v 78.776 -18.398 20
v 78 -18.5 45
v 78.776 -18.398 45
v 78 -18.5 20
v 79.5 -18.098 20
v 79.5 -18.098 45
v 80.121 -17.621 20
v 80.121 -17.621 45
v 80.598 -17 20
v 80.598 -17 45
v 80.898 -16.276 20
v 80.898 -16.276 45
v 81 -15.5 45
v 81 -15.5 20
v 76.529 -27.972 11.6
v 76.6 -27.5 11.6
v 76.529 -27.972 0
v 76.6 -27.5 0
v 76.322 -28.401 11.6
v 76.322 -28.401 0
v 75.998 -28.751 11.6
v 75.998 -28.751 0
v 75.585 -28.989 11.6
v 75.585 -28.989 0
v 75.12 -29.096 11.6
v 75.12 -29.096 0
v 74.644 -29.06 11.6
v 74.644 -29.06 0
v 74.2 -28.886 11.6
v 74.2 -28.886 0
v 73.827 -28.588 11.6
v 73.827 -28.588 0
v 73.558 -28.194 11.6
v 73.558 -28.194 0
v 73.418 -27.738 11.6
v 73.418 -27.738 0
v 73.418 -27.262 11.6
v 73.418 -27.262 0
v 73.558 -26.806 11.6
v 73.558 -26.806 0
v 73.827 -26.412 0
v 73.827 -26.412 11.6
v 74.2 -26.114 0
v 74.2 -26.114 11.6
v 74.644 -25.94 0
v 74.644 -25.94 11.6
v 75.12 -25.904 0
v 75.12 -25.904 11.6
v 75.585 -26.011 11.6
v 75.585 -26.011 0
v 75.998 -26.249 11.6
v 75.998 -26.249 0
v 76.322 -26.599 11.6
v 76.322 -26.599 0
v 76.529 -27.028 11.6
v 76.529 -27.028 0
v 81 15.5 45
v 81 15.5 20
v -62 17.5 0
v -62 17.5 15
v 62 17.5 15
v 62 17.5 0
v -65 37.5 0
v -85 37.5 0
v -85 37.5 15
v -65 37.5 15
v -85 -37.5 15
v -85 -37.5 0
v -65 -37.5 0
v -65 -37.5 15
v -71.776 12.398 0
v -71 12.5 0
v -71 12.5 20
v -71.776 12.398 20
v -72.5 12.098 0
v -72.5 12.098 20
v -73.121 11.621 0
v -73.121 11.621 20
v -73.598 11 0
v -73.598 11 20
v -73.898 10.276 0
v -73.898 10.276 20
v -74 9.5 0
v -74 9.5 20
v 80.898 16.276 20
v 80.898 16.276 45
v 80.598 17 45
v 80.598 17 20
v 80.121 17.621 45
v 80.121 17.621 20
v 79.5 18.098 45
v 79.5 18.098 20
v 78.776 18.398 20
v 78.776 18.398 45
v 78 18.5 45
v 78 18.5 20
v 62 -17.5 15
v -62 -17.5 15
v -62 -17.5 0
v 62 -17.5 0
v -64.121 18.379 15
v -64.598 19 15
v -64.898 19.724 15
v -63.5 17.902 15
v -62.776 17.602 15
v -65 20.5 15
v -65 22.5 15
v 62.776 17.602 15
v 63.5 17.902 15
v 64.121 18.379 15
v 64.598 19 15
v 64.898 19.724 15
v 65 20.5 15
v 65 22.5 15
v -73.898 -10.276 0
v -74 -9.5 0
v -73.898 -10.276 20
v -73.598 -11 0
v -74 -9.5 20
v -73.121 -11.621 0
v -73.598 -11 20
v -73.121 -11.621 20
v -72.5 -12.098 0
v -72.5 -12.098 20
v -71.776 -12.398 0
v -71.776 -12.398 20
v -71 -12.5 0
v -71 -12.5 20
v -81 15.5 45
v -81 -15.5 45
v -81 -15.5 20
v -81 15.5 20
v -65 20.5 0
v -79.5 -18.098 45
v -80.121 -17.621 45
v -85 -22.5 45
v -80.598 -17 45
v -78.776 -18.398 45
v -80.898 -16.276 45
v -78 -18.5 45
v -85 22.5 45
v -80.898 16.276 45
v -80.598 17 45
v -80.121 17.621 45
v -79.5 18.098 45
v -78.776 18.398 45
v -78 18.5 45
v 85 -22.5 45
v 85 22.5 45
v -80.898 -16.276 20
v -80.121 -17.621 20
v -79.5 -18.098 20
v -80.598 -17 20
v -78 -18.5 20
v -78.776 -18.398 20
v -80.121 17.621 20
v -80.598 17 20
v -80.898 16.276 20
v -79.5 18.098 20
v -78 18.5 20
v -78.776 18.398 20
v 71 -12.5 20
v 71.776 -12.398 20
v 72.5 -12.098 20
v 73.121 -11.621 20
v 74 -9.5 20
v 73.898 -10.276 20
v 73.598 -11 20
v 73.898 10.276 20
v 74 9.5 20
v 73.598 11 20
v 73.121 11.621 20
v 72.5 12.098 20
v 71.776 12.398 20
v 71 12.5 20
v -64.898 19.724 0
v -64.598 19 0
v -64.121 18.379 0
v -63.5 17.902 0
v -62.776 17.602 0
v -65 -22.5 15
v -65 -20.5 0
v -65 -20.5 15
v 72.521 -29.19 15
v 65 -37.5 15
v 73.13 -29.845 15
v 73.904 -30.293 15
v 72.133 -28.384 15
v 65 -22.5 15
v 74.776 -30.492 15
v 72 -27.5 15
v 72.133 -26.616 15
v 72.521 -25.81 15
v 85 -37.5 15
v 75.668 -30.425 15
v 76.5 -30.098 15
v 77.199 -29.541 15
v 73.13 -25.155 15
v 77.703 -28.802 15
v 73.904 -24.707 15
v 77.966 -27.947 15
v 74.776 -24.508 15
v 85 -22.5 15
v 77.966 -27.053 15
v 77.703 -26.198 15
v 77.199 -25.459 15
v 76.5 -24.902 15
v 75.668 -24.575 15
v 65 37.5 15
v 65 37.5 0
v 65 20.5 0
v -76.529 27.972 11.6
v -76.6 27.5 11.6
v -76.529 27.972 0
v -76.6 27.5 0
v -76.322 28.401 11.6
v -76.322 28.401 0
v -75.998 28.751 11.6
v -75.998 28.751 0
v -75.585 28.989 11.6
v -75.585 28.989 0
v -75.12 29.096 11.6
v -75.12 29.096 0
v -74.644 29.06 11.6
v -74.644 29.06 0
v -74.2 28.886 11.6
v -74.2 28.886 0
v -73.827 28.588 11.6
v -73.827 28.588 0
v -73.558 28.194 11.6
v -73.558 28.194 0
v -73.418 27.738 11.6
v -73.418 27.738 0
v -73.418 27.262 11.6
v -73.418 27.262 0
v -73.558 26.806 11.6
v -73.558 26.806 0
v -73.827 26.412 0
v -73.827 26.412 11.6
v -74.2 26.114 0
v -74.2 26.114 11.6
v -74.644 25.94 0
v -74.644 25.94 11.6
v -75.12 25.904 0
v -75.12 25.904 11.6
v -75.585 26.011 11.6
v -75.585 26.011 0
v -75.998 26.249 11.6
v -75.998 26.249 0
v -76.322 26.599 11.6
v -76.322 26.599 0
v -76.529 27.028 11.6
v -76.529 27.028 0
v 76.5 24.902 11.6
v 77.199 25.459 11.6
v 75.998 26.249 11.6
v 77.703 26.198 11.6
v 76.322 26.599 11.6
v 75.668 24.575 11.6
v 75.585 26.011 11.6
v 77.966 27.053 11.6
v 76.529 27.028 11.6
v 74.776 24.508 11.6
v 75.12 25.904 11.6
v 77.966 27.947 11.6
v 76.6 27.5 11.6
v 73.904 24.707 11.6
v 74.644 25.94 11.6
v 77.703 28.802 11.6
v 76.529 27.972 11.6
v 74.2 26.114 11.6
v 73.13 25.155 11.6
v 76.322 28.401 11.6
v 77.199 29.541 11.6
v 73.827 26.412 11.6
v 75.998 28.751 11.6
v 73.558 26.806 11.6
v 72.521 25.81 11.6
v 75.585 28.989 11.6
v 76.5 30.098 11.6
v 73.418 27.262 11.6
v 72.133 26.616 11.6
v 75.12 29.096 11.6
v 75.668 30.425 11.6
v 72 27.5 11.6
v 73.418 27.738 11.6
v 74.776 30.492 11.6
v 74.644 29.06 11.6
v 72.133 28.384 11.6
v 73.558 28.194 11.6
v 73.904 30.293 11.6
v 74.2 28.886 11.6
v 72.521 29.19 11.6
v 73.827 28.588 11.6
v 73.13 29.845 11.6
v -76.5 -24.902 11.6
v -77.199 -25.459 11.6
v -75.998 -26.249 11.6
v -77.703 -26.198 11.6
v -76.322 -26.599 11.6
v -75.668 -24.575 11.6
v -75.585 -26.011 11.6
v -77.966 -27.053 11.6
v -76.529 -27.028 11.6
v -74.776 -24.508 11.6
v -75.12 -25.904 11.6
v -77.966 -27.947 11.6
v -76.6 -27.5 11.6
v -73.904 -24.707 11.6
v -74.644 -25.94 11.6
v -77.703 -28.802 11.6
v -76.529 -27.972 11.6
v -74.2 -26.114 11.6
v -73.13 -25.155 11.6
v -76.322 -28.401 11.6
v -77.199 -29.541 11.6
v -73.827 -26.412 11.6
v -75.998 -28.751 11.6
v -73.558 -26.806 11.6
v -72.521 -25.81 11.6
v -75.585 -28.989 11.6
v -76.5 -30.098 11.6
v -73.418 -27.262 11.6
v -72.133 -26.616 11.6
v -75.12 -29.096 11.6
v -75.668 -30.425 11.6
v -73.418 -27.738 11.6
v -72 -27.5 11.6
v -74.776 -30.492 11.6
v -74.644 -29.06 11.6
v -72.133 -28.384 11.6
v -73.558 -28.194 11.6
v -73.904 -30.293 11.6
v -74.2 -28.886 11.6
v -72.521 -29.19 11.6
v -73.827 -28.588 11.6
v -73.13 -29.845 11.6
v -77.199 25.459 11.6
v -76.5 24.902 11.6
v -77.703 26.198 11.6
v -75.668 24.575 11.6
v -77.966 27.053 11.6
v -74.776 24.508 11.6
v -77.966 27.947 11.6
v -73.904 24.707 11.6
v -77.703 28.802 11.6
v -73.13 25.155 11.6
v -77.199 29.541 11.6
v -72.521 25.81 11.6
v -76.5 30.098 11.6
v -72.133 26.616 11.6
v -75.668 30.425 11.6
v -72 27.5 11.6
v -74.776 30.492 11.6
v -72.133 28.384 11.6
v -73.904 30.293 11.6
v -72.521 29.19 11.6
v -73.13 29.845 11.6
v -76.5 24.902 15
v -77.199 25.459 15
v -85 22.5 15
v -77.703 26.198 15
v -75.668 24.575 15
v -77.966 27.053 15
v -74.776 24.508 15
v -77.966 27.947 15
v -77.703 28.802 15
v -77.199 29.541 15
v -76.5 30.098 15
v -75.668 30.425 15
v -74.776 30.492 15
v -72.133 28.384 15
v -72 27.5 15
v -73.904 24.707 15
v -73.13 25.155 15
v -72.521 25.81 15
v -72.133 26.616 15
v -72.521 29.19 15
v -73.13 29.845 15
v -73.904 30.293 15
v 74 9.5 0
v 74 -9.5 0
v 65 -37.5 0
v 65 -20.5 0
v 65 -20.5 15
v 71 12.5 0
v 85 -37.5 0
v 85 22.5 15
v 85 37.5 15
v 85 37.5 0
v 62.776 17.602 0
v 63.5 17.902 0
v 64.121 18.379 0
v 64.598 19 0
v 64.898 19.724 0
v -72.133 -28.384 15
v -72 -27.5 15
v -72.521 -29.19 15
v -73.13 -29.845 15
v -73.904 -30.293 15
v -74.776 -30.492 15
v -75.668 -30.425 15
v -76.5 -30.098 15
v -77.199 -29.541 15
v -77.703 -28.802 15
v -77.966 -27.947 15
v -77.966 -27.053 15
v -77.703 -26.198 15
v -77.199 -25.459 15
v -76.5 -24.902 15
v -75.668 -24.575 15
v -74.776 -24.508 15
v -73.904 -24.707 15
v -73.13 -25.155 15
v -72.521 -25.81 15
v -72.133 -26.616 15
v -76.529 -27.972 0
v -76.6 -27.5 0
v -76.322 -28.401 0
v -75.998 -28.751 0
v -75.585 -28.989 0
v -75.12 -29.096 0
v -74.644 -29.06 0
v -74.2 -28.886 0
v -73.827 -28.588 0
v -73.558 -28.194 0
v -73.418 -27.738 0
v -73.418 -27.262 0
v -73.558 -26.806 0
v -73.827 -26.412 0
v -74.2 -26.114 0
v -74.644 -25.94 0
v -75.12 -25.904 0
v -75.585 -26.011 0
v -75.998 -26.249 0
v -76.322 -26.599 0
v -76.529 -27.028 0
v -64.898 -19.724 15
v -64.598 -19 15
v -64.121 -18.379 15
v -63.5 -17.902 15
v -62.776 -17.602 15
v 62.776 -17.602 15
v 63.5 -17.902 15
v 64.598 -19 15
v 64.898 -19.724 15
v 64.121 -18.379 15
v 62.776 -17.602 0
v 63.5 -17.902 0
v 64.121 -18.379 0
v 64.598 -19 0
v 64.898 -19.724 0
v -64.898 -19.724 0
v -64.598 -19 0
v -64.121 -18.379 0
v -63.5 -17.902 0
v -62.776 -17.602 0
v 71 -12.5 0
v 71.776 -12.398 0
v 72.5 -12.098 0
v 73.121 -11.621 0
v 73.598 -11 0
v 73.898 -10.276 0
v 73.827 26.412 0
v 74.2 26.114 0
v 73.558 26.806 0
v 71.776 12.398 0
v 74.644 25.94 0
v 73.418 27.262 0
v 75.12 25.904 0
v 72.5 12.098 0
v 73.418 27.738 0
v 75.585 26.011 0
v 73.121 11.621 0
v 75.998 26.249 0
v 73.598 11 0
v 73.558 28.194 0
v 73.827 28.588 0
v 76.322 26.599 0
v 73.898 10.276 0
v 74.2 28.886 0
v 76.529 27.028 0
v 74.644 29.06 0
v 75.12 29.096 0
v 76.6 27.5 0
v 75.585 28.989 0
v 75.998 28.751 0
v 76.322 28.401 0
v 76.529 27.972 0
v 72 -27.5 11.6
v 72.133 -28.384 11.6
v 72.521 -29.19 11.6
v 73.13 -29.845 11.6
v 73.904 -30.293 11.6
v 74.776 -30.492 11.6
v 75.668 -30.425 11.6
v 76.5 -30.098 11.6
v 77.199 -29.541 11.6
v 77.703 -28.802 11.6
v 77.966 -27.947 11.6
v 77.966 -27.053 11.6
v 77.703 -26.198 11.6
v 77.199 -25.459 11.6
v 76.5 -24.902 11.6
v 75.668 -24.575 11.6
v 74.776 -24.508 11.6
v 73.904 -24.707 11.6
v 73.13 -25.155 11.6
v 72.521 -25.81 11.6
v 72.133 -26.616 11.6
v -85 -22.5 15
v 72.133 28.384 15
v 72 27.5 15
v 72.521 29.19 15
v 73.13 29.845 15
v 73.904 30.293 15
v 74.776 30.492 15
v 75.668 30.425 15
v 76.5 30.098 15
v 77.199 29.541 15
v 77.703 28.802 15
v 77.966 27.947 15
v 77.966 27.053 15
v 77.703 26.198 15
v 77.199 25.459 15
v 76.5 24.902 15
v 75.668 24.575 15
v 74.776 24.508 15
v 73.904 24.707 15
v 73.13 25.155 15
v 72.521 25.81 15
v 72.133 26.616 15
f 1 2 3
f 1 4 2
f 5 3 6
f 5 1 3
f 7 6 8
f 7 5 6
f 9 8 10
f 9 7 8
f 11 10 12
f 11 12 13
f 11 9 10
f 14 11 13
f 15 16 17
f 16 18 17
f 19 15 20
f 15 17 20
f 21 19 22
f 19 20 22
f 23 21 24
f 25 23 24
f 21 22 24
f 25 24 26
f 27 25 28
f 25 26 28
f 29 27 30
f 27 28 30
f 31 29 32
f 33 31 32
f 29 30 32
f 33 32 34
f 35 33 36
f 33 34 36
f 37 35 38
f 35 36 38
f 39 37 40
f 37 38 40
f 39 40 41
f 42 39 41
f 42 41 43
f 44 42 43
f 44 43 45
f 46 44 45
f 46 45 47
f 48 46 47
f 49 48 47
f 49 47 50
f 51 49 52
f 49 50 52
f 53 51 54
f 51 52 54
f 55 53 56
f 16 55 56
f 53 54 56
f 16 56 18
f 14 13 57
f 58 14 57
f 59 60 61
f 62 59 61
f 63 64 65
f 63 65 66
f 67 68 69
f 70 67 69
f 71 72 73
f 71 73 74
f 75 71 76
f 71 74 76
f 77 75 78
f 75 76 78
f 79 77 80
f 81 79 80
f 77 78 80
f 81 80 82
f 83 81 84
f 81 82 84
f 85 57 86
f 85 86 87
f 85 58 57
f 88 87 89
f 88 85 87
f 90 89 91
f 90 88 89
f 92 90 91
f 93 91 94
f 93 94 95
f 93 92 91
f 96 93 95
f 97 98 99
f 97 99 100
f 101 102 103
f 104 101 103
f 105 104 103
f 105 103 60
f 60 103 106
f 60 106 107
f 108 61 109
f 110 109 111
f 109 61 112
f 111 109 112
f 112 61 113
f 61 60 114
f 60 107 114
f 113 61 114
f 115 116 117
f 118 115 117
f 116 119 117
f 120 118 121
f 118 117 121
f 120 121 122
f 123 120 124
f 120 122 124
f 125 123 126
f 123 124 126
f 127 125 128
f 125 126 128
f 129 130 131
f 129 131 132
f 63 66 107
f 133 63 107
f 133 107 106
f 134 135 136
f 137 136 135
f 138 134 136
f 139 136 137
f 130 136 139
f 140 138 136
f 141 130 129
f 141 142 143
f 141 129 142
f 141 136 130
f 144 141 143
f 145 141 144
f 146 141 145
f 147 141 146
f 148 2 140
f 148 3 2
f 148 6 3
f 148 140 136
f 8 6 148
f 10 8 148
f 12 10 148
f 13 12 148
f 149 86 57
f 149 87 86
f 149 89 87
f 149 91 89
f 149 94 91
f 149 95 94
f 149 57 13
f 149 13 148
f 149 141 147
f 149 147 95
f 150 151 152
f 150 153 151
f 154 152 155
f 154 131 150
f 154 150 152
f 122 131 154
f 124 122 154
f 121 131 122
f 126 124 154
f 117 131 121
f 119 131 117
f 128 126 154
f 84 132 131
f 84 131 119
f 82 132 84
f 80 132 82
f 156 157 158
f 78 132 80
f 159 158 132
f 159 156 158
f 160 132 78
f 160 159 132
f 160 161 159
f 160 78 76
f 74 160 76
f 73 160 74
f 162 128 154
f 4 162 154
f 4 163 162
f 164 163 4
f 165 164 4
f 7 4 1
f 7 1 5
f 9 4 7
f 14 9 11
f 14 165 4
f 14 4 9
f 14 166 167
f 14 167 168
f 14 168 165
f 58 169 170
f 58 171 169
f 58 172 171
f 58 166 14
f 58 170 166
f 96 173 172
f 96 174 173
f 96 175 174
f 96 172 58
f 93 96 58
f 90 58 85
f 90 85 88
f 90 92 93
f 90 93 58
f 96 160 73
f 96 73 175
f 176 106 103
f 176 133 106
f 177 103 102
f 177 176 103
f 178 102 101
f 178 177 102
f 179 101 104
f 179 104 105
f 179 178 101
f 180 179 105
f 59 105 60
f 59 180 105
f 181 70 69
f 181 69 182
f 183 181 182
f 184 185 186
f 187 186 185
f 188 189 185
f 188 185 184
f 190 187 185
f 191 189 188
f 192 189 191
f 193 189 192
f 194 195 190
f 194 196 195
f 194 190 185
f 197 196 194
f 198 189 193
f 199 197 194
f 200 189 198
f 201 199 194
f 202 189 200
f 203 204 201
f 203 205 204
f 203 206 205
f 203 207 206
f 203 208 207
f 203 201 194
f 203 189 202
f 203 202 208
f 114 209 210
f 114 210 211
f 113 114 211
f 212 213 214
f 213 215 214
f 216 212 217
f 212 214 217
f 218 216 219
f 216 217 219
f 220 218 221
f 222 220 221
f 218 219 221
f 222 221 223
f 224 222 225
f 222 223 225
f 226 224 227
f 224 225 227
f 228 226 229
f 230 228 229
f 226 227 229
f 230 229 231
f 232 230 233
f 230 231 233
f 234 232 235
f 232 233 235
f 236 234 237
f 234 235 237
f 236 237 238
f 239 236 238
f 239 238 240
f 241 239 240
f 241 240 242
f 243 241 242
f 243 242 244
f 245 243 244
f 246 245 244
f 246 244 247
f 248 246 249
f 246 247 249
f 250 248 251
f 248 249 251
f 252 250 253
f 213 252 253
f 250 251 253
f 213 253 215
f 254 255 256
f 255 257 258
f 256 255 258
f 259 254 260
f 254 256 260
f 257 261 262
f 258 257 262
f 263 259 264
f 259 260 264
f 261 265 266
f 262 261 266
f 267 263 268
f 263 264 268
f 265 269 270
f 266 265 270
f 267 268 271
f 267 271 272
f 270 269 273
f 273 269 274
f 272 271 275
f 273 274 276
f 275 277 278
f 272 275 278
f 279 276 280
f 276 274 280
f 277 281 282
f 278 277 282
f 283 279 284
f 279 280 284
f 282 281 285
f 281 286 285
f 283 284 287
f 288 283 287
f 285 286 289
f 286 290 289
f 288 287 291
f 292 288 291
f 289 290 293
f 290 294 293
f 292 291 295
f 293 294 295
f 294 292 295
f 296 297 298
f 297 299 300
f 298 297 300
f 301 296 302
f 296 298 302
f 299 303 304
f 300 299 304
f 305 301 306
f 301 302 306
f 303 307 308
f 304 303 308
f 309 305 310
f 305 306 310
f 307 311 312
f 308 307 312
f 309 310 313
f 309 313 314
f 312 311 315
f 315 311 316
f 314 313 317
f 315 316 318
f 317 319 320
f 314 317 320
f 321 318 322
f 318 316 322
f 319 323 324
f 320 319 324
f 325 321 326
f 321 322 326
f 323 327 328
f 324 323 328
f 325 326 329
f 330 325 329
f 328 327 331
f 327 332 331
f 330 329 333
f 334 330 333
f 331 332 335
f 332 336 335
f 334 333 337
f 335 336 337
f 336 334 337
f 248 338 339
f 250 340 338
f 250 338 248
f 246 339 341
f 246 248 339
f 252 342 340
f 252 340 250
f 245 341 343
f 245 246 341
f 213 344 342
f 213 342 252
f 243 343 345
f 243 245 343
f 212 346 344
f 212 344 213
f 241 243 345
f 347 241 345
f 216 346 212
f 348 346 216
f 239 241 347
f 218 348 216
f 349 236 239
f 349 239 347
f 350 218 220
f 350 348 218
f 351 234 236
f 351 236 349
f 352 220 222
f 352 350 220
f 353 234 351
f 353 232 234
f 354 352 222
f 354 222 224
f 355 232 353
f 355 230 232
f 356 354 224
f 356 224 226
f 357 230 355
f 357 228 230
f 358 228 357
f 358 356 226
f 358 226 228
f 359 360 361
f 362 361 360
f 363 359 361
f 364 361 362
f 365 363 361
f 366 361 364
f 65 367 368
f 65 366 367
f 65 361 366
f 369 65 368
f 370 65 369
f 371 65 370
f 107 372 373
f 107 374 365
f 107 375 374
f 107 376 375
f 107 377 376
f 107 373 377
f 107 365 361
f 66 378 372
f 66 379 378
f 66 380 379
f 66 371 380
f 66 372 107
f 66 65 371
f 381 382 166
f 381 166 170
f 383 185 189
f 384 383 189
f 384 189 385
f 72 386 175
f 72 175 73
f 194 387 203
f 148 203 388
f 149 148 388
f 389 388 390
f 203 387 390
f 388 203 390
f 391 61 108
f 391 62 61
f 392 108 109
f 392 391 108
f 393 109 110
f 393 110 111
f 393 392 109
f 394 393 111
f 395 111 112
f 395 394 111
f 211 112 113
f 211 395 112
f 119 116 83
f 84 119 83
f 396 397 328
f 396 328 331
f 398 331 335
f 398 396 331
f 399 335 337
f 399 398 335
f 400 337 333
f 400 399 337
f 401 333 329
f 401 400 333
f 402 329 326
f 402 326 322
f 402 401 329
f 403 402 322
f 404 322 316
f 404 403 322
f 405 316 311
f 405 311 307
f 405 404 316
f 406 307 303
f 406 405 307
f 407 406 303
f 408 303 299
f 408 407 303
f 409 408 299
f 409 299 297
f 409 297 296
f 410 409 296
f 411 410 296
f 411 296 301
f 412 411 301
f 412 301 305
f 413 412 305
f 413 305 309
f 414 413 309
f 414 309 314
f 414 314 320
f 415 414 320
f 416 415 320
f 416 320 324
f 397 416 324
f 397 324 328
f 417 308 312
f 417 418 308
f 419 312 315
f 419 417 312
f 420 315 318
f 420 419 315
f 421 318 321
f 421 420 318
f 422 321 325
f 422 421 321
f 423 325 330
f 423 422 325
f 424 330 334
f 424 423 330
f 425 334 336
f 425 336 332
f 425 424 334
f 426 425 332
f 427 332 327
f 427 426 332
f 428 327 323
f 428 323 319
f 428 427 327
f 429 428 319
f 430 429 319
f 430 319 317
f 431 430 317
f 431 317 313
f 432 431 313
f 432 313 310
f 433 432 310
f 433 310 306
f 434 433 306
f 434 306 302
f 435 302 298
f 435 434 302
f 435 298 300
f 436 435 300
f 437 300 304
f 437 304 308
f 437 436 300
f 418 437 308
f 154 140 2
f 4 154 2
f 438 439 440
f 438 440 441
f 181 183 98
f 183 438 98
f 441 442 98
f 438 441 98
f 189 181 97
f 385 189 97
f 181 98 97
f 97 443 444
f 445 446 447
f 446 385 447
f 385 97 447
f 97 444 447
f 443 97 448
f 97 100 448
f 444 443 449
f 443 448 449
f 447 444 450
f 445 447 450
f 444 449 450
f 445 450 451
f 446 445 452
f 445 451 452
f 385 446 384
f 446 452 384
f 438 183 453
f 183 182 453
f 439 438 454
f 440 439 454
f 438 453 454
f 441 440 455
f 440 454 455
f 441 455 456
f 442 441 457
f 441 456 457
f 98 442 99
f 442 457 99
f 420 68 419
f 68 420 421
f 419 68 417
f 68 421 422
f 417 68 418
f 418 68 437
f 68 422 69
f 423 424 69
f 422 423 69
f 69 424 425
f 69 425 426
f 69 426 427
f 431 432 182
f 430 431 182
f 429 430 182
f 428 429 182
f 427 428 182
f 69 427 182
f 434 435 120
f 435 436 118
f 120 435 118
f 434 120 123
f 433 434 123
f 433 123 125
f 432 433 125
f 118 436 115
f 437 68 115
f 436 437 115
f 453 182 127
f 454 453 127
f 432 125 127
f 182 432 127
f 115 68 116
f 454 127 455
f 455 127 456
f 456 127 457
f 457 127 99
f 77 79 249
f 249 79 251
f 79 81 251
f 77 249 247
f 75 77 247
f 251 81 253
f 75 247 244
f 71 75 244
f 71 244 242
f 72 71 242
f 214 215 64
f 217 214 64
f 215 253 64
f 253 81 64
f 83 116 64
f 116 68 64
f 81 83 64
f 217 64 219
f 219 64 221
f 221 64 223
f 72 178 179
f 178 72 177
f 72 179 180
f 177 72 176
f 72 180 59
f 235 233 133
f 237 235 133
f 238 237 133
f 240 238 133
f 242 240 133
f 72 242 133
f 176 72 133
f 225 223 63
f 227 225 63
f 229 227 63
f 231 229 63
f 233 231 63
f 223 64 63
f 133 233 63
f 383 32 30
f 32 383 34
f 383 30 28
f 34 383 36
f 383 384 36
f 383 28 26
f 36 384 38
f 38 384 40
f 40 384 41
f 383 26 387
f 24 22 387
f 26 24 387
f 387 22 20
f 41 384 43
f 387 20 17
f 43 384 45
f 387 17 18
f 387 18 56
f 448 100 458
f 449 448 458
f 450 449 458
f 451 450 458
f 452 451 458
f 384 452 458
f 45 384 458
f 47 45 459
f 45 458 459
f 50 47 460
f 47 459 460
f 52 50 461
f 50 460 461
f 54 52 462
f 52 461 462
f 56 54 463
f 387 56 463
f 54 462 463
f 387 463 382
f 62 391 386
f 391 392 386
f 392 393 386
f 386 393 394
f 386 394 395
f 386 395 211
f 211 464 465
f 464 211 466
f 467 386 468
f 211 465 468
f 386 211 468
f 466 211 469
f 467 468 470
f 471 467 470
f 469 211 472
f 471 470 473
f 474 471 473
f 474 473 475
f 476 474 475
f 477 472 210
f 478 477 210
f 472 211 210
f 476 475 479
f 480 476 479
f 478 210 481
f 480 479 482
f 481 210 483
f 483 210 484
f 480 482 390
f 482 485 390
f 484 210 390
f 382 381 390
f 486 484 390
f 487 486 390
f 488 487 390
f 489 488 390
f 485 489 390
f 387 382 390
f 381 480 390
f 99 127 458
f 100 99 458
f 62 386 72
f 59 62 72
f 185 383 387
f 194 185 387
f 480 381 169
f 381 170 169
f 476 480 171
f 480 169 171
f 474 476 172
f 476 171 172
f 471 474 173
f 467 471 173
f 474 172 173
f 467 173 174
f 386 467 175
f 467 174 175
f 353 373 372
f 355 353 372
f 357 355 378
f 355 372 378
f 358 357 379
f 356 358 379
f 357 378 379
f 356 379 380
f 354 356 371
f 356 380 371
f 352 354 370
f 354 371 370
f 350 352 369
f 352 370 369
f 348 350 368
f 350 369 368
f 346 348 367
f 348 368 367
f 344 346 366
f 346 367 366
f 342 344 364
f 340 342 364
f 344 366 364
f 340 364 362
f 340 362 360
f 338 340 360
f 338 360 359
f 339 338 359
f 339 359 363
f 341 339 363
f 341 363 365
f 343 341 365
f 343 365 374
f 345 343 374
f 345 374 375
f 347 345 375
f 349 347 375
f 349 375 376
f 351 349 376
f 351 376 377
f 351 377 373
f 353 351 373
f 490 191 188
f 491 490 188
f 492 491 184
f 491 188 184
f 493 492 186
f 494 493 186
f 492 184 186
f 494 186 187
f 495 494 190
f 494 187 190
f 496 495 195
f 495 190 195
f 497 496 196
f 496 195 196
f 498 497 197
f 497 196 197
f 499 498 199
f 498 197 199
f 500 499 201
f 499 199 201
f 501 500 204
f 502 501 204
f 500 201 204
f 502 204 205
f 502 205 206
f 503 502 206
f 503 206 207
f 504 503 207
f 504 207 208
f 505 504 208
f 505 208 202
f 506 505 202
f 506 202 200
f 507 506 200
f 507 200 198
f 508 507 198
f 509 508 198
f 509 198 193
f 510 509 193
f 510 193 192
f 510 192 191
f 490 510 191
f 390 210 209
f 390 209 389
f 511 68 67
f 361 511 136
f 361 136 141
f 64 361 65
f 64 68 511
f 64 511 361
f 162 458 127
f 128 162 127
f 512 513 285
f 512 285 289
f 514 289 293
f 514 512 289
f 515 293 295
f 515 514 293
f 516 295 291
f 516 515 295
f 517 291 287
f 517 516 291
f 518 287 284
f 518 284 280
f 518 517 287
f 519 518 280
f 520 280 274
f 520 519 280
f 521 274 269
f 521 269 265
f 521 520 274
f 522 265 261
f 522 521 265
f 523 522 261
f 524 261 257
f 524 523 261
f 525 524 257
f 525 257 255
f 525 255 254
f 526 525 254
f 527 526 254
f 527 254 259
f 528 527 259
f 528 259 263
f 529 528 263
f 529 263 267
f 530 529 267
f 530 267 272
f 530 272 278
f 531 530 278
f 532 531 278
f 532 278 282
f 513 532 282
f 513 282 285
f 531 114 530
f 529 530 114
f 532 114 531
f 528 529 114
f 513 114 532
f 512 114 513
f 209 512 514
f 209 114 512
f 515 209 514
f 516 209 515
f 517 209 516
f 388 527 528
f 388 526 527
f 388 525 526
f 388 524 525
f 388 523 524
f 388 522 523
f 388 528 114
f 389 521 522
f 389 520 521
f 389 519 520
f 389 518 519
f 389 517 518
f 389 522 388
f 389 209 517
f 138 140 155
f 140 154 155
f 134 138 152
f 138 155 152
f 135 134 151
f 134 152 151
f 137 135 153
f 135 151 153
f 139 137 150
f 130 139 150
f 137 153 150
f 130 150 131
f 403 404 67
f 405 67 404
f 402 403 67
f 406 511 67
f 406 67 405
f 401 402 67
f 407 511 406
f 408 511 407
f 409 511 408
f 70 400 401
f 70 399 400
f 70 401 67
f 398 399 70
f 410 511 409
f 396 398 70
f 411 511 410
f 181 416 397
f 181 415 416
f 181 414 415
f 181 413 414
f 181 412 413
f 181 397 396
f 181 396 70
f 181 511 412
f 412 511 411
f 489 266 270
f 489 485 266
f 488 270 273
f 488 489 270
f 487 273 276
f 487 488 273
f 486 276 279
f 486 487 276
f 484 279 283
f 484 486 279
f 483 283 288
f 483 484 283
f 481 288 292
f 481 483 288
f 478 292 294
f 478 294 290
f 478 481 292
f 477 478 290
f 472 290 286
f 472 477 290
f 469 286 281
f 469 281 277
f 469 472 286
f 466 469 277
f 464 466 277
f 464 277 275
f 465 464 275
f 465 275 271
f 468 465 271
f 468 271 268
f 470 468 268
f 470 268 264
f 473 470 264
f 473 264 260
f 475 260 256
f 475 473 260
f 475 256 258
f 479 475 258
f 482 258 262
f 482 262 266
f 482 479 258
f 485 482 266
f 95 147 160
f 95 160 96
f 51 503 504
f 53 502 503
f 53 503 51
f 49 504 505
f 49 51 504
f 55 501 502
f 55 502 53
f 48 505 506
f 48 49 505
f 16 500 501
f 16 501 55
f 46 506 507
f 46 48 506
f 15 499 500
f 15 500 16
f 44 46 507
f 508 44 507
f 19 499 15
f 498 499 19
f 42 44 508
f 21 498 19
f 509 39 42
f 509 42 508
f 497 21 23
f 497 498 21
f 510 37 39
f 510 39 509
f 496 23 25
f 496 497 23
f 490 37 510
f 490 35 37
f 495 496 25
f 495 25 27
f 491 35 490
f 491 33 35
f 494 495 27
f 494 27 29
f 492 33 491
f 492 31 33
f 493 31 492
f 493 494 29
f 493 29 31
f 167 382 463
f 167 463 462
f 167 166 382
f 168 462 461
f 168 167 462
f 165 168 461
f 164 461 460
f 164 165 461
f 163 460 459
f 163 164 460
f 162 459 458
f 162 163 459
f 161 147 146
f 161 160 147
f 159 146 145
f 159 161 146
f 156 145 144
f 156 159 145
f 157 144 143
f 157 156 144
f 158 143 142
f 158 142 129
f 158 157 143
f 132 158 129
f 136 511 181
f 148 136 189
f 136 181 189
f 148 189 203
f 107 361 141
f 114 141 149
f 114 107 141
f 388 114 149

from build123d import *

# Parameters (mm, degrees)
SKETCH1_W                                            = 170
SKETCH1_H                                            = 75
BOSS_EXTRUDE1_DEPTH                                  = 15
SKETCH2_W                                            = 130
SKETCH2_H                                            = 20
CUT_EXTRUDE1_DEPTH                                   = 95.107651124
CBORE_FOR_M3_HEXAGON_SOCKET_HEAD_CAP_SCR_D           = 3.2
CBORE_FOR_M3_HEXAGON_SOCKET_HEAD_CAP_SCR_CBORE_D     = 6
CBORE_FOR_M3_HEXAGON_SOCKET_HEAD_CAP_SCR_CBORE_DEPTH = 3.4
MIRROR2_AT_THE_SECOND_PLANE_COPY_1_D                 = 3.2
MIRROR2_AT_THE_SECOND_PLANE_COPY_1_CBORE_D           = 6
MIRROR2_AT_THE_SECOND_PLANE_COPY_1_CBORE_DEPTH       = 3.4
FILLET1_R                                            = 3
SKETCH9_W                                            = 170
SKETCH9_H                                            = 45
BOSS_EXTRUDE3_DEPTH                                  = 30
SKETCH8_W                                            = 148
SKETCH8_H                                            = 25
CUT_EXTRUDE2_DEPTH                                   = 104.22911411
SKETCH10_W                                           = 162
SKETCH10_H                                           = 37
CUT_EXTRUDE3_DEPTH                                   = 25
FILLET2_R                                            = 3


with BuildPart() as part:
    # Sketch1 → Boss-Extrude1 (new body)
    with BuildSketch(Plane.XY):
        Rectangle(SKETCH1_W, SKETCH1_H)
    extrude(amount=BOSS_EXTRUDE1_DEPTH)

    # Sketch2 → Cut-Extrude1 (cut, through all)
    with BuildSketch(Plane.XY.offset(15)):
        with Locations((0, -27.5)):
            Rectangle(SKETCH2_W, SKETCH2_H)
    cut_extrude1 = extrude(amount=-CUT_EXTRUDE1_DEPTH, mode=Mode.SUBTRACT)

    # Mirror1: Cut-Extrude1 across plane
    add(cut_extrude1.mirror(Plane.ZX), mode=Mode.SUBTRACT)

    # CBORE for M3 Hexagon socket head cap screws1 (through all)
    with Locations(Plane.XY.offset(15)):
        with Locations((-75, 27.5)):
            cbore_for_m3_hexagon_socket_head_cap_scr = CounterBoreHole(CBORE_FOR_M3_HEXAGON_SOCKET_HEAD_CAP_SCR_D / 2, CBORE_FOR_M3_HEXAGON_SOCKET_HEAD_CAP_SCR_CBORE_D / 2, CBORE_FOR_M3_HEXAGON_SOCKET_HEAD_CAP_SCR_CBORE_DEPTH)

    # Mirror2: CBORE for M3 Hexagon socket head cap screws1 across plane
    add(cbore_for_m3_hexagon_socket_head_cap_scr.mirror(Plane(origin=(0, 0, 0), x_dir=(0, 0, 1), z_dir=(1, 0, 0))), mode=Mode.SUBTRACT)

    # Mirror2 at the second plane: CBORE for M3 Hexagon socket head cap screws1 across plane
    add(cbore_for_m3_hexagon_socket_head_cap_scr.mirror(Plane.ZX), mode=Mode.SUBTRACT)

    # Mirror2 at the second plane copy 1 (through all)
    with Locations(Plane(origin=(0, 0, 15), x_dir=(-1, 0, 0), z_dir=(0, 0, 1))):
        with Locations((-75, 27.5)):
            CounterBoreHole(MIRROR2_AT_THE_SECOND_PLANE_COPY_1_D / 2, MIRROR2_AT_THE_SECOND_PLANE_COPY_1_CBORE_D / 2, MIRROR2_AT_THE_SECOND_PLANE_COPY_1_CBORE_DEPTH)

    # Fillet1
    fillet1_edges = [part.edges().sort_by_distance(p)[0] for p in [
        (-65, -17.5, 7.5),
        (65, -17.5, 7.5),
        (-65, 17.5, 7.5),
        (65, 17.5, 7.5),
    ]]
    fillet(fillet1_edges, radius=FILLET1_R)

    # Sketch9 → Boss-Extrude3 (add)
    with BuildSketch(Plane.XY.offset(15)):
        Rectangle(SKETCH9_W, SKETCH9_H)
    extrude(amount=BOSS_EXTRUDE3_DEPTH)

    # Sketch8 → Cut-Extrude2 (cut, through all)
    with BuildSketch(Plane(origin=(0, 0, 0), x_dir=(-1, 0, 0), z_dir=(0, 0, -1))):
        Rectangle(SKETCH8_W, SKETCH8_H)
    extrude(amount=-CUT_EXTRUDE2_DEPTH, mode=Mode.SUBTRACT)

    # Sketch10 → Cut-Extrude3 (cut)
    with BuildSketch(Plane.XY.offset(45)):
        Rectangle(SKETCH10_W, SKETCH10_H)
    extrude(amount=-CUT_EXTRUDE3_DEPTH, mode=Mode.SUBTRACT)

    # Fillet2
    fillet2_edges = [part.edges().sort_by_distance(p)[0] for p in [
        (-74, -12.5, 10),
        (74, -12.5, 10),
        (-74, 12.5, 10),
        (74, 12.5, 10),
        (-81, -18.5, 32.5),
        (-81, 18.5, 32.5),
        (81, 18.5, 32.5),
        (81, -18.5, 32.5),
    ]]
    fillet(fillet2_edges, radius=FILLET2_R)


solid = part.part
